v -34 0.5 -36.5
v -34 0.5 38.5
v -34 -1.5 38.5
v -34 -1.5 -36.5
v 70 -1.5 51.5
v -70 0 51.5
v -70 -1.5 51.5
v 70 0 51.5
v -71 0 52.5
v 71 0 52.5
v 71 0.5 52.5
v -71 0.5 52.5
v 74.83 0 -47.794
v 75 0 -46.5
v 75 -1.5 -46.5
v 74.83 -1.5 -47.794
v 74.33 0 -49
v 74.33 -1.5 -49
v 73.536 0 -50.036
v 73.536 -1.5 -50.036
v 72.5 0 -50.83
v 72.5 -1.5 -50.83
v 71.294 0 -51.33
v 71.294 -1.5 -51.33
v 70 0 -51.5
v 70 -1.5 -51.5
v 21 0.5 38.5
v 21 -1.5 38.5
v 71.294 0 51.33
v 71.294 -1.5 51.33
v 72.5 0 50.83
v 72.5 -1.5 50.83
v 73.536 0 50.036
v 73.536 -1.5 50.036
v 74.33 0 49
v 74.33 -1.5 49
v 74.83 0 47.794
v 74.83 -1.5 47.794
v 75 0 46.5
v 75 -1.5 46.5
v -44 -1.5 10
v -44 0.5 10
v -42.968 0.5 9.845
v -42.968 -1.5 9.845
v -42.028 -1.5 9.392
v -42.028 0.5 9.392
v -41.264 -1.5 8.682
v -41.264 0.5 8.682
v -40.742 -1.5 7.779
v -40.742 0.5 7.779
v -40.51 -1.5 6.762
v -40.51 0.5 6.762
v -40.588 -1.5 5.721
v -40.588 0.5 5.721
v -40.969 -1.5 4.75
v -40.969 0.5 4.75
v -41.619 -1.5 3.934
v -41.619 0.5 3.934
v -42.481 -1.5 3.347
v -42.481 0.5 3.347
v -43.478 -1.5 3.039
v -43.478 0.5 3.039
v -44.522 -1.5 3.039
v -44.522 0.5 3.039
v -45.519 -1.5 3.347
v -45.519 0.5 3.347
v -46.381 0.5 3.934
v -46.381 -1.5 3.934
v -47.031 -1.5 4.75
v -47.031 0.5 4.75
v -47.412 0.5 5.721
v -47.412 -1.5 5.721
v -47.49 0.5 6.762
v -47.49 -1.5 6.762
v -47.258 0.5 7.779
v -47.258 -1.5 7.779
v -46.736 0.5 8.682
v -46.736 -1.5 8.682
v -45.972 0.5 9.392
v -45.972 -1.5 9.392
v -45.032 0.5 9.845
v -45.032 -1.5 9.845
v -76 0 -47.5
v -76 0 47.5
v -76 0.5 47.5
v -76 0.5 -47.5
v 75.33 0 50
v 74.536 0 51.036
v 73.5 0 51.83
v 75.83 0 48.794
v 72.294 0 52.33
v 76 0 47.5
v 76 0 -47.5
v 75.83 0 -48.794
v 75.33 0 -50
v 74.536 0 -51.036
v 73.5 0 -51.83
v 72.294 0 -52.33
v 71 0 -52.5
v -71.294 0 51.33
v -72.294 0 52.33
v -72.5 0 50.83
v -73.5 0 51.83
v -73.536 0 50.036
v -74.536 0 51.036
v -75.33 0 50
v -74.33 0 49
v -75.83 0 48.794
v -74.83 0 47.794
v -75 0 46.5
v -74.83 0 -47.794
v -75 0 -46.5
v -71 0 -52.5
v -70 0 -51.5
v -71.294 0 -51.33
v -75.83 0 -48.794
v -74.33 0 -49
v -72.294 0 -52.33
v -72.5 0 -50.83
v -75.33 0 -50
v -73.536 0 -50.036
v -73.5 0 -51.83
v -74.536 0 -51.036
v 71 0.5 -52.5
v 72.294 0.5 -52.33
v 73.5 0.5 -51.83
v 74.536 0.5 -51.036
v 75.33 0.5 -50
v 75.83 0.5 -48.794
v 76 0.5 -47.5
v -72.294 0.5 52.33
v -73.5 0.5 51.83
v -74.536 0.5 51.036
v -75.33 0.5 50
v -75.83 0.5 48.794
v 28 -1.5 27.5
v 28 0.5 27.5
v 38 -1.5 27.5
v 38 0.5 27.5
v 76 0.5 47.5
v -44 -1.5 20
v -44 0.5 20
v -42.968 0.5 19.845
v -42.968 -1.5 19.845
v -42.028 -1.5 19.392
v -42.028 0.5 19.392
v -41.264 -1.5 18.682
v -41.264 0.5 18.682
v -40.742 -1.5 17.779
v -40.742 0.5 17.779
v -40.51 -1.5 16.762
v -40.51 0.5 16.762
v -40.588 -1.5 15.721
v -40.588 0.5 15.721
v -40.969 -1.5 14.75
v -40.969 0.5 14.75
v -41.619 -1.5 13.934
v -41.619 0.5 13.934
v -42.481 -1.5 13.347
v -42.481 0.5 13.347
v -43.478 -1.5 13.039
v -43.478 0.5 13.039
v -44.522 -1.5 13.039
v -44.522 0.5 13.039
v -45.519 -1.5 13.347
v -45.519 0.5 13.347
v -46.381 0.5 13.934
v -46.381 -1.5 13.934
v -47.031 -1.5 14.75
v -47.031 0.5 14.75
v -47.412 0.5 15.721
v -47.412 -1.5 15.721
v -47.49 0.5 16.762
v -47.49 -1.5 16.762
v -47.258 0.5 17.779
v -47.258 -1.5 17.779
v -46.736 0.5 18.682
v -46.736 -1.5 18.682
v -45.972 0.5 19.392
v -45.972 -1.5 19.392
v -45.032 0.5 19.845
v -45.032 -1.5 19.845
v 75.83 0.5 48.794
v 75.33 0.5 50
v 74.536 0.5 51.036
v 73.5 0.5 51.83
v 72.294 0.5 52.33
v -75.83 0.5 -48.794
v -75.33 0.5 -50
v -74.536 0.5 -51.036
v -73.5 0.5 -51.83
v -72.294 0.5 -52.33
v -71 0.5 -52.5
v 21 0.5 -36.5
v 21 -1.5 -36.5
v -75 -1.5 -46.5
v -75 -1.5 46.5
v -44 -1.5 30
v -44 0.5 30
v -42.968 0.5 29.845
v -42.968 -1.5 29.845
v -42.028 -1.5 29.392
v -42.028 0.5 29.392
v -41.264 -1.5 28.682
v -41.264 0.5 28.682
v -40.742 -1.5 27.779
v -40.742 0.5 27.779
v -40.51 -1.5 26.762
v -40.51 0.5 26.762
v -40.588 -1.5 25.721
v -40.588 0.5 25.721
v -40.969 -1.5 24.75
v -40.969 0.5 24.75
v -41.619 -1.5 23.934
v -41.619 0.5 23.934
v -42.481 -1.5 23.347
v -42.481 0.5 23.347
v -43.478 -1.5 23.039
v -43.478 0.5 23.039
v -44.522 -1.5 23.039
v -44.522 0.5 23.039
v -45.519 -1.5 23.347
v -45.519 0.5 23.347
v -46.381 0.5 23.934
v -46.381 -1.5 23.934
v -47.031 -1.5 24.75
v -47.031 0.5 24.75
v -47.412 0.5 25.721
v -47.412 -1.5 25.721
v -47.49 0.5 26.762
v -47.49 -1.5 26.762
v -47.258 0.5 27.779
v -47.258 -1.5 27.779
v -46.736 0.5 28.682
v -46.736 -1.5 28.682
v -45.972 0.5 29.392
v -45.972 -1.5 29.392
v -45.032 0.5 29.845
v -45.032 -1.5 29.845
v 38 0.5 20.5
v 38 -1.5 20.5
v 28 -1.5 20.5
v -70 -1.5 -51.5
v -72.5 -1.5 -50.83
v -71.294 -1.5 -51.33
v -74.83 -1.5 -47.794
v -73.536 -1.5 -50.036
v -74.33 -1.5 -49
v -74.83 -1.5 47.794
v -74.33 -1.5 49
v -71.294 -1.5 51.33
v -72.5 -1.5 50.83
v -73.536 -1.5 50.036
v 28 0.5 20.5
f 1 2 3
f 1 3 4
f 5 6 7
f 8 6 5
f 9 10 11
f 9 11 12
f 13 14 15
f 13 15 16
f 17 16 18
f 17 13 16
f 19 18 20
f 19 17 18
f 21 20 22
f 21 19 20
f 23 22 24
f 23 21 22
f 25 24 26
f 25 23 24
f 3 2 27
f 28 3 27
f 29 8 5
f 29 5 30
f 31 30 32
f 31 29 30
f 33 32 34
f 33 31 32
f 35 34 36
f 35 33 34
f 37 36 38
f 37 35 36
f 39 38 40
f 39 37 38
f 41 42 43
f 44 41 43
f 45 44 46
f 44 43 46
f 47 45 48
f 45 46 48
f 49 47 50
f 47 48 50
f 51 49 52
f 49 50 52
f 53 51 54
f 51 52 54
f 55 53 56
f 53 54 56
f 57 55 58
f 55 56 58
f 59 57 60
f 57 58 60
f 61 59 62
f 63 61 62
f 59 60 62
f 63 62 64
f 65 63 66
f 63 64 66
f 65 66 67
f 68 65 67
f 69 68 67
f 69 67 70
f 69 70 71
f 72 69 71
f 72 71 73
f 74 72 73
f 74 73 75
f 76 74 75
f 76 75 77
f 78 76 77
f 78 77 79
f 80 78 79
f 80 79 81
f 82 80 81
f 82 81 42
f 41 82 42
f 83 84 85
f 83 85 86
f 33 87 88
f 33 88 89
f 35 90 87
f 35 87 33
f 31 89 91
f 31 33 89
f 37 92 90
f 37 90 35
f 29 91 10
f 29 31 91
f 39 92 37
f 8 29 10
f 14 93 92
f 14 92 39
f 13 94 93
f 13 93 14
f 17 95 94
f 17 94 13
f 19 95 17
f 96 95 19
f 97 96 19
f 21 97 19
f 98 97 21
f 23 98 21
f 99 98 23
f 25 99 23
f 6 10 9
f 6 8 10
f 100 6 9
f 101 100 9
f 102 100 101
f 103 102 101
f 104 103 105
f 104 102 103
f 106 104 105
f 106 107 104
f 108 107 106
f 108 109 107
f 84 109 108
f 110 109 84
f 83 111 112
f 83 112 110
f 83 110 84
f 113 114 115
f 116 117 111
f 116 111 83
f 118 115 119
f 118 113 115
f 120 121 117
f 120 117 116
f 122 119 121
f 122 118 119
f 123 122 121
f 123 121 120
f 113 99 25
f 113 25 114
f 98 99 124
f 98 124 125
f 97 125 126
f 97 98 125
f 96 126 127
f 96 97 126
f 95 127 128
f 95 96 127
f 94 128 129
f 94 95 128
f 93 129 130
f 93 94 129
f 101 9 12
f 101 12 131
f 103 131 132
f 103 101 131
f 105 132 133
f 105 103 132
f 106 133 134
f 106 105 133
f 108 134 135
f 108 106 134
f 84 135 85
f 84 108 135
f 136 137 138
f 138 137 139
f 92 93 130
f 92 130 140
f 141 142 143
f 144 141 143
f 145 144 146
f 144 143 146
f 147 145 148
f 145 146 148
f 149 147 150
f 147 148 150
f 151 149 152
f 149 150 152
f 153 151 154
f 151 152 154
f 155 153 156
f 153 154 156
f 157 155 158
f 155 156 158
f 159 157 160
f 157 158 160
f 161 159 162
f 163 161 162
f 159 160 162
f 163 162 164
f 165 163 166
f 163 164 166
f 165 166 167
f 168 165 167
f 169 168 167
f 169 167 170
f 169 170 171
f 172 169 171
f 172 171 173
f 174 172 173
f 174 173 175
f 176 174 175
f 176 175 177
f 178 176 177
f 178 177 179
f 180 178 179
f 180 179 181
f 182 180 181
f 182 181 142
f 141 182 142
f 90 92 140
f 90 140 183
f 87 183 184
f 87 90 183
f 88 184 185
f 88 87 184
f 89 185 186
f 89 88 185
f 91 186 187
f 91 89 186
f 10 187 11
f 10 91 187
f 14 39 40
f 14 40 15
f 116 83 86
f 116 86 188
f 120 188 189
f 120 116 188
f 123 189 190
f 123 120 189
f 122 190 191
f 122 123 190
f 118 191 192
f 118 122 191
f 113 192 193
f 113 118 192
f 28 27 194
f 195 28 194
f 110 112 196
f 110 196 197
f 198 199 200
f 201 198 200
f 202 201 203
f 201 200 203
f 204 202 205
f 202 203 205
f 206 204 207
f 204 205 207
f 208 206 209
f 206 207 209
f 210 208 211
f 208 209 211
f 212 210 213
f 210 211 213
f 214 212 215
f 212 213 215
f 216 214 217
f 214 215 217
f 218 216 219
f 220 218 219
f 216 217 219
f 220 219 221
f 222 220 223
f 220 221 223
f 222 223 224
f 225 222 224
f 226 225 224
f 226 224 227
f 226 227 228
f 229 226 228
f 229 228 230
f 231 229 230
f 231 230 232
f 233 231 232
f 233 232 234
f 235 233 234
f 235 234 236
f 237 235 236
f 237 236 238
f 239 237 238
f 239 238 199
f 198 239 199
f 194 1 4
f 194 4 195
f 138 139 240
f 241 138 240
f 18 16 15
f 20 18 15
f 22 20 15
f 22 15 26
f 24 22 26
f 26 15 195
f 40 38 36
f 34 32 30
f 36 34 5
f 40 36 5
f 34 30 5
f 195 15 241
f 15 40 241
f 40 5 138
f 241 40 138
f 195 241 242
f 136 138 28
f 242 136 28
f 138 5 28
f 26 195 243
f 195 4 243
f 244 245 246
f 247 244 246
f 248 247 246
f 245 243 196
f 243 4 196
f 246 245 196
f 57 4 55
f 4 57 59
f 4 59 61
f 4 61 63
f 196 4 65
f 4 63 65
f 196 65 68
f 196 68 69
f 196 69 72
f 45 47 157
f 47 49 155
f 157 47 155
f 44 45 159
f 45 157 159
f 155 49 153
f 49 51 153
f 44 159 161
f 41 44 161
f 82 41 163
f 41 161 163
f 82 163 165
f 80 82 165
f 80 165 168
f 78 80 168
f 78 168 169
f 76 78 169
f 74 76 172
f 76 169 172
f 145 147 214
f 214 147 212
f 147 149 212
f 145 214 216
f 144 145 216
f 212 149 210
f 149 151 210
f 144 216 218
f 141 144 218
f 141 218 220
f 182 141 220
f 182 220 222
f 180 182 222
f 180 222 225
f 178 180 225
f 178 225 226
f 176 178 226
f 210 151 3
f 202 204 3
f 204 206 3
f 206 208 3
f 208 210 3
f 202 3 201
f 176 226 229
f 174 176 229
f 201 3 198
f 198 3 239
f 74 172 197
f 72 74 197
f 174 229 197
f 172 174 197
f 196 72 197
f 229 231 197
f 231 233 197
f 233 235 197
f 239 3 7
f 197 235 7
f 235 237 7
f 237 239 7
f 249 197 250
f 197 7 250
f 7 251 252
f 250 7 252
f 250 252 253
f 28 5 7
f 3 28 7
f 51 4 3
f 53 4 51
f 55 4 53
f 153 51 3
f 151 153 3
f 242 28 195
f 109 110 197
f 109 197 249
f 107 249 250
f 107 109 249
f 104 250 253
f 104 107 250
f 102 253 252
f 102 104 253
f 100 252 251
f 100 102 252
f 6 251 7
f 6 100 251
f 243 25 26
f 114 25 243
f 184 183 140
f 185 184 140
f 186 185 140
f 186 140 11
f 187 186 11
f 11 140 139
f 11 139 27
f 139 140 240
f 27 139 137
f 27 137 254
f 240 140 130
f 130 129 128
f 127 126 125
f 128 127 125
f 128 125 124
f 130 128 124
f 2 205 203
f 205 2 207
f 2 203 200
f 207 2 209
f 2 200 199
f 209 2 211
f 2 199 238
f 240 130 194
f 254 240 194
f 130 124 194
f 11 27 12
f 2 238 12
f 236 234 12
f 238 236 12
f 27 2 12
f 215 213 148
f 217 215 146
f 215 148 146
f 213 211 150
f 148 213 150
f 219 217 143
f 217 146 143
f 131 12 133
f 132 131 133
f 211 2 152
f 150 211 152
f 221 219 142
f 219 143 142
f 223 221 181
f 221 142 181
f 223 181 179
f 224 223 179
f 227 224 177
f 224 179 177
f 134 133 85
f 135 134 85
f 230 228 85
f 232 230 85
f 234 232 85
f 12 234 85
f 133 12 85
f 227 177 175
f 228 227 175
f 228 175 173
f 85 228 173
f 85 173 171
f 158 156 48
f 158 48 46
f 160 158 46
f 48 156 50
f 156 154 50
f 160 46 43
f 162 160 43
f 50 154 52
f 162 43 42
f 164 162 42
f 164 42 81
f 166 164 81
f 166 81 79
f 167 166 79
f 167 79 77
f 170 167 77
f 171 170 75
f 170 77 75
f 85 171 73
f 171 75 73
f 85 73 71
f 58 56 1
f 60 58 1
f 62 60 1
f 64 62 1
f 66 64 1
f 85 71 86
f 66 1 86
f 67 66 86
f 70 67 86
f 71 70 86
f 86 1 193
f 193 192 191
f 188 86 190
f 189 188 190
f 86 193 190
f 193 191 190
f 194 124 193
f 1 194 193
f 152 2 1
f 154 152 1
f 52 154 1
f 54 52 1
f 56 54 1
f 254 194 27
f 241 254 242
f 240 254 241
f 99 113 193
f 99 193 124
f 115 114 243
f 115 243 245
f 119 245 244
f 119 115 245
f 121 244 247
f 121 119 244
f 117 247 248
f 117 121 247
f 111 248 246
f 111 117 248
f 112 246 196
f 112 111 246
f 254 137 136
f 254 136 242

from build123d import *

# Parameters (mm, degrees)
EXTRUDE_5_DEPTH      = 0.5
EXTRUDE_6_DEPTH      = 1.5
SKETCH_19_W          = 55
SKETCH_19_H          = 75
CUT_EXTRUDE_10_DEPTH = 33
SKETCH_20_W          = 10
SKETCH_20_H          = 7
CUT_EXTRUDE_11_DEPTH = 33
SKETCH_21_R          = 3.5
CUT_EXTRUDE_12_DEPTH = 33


with BuildPart() as part:
    # 草图16 → 凸台-拉伸5 (new body)
    with BuildSketch(Plane(origin=(0, 0, 0), x_dir=(1, 0, 0), z_dir=(0, 1, 0))):
        with BuildLine():
            Line((71, -52.5), (-71, -52.5))
            ThreePointArc((-71, -52.5), (-74.535533906, -51.035533906), (-76, -47.5))
            Line((-76, -47.5), (-76, 47.5))
            ThreePointArc((-76, 47.5), (-74.535533906, 51.035533906), (-71, 52.5))
            Line((-71, 52.5), (71, 52.5))
            ThreePointArc((71, 52.5), (74.535533906, 51.035533906), (76, 47.5))
            Line((76, 47.5), (76, -47.5))
            ThreePointArc((76, -47.5), (74.535533906, -51.035533906), (71, -52.5))
        make_face()
    extrude(amount=EXTRUDE_5_DEPTH)

    # 草图18 → 凸台-拉伸6 (add)
    with BuildSketch(Plane.XZ):
        with BuildLine():
            Line((70, -51.5), (-70, -51.5))
            ThreePointArc((-70, -51.5), (-73.535533906, -50.035533906), (-75, -46.5))
            Line((-75, -46.5), (-75, 46.5))
            ThreePointArc((-75, 46.5), (-73.535533906, 50.035533906), (-70, 51.5))
            Line((-70, 51.5), (70, 51.5))
            ThreePointArc((70, 51.5), (73.535533906, 50.035533906), (75, 46.5))
            Line((75, 46.5), (75, -46.5))
            ThreePointArc((75, -46.5), (73.535533906, -50.035533906), (70, -51.5))
        make_face()
    extrude(amount=EXTRUDE_6_DEPTH)

    # 草图19 → 切除-拉伸10 (cut)
    with BuildSketch(Plane(origin=(0, 0.5, 0), x_dir=(1, 0, 0), z_dir=(0, 1, 0))):
        with Locations((-6.5, -1)):
            Rectangle(SKETCH_19_W, SKETCH_19_H)
    extrude(amount=-CUT_EXTRUDE_10_DEPTH, mode=Mode.SUBTRACT)

    # 草图20 → 切除-拉伸11 (cut)
    with BuildSketch(Plane(origin=(0, 0.5, 0), x_dir=(1, 0, 0), z_dir=(0, 1, 0))):
        with Locations((33, -24)):
            Rectangle(SKETCH_20_W, SKETCH_20_H)
    extrude(amount=-CUT_EXTRUDE_11_DEPTH, mode=Mode.SUBTRACT)

    # 草图21 → 切除-拉伸12 (cut)
    with BuildSketch(Plane(origin=(0, 0.5, 0), x_dir=(1, 0, 0), z_dir=(0, 1, 0))):
        with Locations(Location((-44, -6.5, 0), (0, 0, 270))):
            Circle(SKETCH_21_R)
        with Locations(Location((-44, -16.5, 0), (0, 0, 270))):
            Circle(SKETCH_21_R)
        with Locations(Location((-44, -26.5, 0), (0, 0, 270))):
            Circle(SKETCH_21_R)
    extrude(amount=-CUT_EXTRUDE_12_DEPTH, mode=Mode.SUBTRACT)


solid = part.part
